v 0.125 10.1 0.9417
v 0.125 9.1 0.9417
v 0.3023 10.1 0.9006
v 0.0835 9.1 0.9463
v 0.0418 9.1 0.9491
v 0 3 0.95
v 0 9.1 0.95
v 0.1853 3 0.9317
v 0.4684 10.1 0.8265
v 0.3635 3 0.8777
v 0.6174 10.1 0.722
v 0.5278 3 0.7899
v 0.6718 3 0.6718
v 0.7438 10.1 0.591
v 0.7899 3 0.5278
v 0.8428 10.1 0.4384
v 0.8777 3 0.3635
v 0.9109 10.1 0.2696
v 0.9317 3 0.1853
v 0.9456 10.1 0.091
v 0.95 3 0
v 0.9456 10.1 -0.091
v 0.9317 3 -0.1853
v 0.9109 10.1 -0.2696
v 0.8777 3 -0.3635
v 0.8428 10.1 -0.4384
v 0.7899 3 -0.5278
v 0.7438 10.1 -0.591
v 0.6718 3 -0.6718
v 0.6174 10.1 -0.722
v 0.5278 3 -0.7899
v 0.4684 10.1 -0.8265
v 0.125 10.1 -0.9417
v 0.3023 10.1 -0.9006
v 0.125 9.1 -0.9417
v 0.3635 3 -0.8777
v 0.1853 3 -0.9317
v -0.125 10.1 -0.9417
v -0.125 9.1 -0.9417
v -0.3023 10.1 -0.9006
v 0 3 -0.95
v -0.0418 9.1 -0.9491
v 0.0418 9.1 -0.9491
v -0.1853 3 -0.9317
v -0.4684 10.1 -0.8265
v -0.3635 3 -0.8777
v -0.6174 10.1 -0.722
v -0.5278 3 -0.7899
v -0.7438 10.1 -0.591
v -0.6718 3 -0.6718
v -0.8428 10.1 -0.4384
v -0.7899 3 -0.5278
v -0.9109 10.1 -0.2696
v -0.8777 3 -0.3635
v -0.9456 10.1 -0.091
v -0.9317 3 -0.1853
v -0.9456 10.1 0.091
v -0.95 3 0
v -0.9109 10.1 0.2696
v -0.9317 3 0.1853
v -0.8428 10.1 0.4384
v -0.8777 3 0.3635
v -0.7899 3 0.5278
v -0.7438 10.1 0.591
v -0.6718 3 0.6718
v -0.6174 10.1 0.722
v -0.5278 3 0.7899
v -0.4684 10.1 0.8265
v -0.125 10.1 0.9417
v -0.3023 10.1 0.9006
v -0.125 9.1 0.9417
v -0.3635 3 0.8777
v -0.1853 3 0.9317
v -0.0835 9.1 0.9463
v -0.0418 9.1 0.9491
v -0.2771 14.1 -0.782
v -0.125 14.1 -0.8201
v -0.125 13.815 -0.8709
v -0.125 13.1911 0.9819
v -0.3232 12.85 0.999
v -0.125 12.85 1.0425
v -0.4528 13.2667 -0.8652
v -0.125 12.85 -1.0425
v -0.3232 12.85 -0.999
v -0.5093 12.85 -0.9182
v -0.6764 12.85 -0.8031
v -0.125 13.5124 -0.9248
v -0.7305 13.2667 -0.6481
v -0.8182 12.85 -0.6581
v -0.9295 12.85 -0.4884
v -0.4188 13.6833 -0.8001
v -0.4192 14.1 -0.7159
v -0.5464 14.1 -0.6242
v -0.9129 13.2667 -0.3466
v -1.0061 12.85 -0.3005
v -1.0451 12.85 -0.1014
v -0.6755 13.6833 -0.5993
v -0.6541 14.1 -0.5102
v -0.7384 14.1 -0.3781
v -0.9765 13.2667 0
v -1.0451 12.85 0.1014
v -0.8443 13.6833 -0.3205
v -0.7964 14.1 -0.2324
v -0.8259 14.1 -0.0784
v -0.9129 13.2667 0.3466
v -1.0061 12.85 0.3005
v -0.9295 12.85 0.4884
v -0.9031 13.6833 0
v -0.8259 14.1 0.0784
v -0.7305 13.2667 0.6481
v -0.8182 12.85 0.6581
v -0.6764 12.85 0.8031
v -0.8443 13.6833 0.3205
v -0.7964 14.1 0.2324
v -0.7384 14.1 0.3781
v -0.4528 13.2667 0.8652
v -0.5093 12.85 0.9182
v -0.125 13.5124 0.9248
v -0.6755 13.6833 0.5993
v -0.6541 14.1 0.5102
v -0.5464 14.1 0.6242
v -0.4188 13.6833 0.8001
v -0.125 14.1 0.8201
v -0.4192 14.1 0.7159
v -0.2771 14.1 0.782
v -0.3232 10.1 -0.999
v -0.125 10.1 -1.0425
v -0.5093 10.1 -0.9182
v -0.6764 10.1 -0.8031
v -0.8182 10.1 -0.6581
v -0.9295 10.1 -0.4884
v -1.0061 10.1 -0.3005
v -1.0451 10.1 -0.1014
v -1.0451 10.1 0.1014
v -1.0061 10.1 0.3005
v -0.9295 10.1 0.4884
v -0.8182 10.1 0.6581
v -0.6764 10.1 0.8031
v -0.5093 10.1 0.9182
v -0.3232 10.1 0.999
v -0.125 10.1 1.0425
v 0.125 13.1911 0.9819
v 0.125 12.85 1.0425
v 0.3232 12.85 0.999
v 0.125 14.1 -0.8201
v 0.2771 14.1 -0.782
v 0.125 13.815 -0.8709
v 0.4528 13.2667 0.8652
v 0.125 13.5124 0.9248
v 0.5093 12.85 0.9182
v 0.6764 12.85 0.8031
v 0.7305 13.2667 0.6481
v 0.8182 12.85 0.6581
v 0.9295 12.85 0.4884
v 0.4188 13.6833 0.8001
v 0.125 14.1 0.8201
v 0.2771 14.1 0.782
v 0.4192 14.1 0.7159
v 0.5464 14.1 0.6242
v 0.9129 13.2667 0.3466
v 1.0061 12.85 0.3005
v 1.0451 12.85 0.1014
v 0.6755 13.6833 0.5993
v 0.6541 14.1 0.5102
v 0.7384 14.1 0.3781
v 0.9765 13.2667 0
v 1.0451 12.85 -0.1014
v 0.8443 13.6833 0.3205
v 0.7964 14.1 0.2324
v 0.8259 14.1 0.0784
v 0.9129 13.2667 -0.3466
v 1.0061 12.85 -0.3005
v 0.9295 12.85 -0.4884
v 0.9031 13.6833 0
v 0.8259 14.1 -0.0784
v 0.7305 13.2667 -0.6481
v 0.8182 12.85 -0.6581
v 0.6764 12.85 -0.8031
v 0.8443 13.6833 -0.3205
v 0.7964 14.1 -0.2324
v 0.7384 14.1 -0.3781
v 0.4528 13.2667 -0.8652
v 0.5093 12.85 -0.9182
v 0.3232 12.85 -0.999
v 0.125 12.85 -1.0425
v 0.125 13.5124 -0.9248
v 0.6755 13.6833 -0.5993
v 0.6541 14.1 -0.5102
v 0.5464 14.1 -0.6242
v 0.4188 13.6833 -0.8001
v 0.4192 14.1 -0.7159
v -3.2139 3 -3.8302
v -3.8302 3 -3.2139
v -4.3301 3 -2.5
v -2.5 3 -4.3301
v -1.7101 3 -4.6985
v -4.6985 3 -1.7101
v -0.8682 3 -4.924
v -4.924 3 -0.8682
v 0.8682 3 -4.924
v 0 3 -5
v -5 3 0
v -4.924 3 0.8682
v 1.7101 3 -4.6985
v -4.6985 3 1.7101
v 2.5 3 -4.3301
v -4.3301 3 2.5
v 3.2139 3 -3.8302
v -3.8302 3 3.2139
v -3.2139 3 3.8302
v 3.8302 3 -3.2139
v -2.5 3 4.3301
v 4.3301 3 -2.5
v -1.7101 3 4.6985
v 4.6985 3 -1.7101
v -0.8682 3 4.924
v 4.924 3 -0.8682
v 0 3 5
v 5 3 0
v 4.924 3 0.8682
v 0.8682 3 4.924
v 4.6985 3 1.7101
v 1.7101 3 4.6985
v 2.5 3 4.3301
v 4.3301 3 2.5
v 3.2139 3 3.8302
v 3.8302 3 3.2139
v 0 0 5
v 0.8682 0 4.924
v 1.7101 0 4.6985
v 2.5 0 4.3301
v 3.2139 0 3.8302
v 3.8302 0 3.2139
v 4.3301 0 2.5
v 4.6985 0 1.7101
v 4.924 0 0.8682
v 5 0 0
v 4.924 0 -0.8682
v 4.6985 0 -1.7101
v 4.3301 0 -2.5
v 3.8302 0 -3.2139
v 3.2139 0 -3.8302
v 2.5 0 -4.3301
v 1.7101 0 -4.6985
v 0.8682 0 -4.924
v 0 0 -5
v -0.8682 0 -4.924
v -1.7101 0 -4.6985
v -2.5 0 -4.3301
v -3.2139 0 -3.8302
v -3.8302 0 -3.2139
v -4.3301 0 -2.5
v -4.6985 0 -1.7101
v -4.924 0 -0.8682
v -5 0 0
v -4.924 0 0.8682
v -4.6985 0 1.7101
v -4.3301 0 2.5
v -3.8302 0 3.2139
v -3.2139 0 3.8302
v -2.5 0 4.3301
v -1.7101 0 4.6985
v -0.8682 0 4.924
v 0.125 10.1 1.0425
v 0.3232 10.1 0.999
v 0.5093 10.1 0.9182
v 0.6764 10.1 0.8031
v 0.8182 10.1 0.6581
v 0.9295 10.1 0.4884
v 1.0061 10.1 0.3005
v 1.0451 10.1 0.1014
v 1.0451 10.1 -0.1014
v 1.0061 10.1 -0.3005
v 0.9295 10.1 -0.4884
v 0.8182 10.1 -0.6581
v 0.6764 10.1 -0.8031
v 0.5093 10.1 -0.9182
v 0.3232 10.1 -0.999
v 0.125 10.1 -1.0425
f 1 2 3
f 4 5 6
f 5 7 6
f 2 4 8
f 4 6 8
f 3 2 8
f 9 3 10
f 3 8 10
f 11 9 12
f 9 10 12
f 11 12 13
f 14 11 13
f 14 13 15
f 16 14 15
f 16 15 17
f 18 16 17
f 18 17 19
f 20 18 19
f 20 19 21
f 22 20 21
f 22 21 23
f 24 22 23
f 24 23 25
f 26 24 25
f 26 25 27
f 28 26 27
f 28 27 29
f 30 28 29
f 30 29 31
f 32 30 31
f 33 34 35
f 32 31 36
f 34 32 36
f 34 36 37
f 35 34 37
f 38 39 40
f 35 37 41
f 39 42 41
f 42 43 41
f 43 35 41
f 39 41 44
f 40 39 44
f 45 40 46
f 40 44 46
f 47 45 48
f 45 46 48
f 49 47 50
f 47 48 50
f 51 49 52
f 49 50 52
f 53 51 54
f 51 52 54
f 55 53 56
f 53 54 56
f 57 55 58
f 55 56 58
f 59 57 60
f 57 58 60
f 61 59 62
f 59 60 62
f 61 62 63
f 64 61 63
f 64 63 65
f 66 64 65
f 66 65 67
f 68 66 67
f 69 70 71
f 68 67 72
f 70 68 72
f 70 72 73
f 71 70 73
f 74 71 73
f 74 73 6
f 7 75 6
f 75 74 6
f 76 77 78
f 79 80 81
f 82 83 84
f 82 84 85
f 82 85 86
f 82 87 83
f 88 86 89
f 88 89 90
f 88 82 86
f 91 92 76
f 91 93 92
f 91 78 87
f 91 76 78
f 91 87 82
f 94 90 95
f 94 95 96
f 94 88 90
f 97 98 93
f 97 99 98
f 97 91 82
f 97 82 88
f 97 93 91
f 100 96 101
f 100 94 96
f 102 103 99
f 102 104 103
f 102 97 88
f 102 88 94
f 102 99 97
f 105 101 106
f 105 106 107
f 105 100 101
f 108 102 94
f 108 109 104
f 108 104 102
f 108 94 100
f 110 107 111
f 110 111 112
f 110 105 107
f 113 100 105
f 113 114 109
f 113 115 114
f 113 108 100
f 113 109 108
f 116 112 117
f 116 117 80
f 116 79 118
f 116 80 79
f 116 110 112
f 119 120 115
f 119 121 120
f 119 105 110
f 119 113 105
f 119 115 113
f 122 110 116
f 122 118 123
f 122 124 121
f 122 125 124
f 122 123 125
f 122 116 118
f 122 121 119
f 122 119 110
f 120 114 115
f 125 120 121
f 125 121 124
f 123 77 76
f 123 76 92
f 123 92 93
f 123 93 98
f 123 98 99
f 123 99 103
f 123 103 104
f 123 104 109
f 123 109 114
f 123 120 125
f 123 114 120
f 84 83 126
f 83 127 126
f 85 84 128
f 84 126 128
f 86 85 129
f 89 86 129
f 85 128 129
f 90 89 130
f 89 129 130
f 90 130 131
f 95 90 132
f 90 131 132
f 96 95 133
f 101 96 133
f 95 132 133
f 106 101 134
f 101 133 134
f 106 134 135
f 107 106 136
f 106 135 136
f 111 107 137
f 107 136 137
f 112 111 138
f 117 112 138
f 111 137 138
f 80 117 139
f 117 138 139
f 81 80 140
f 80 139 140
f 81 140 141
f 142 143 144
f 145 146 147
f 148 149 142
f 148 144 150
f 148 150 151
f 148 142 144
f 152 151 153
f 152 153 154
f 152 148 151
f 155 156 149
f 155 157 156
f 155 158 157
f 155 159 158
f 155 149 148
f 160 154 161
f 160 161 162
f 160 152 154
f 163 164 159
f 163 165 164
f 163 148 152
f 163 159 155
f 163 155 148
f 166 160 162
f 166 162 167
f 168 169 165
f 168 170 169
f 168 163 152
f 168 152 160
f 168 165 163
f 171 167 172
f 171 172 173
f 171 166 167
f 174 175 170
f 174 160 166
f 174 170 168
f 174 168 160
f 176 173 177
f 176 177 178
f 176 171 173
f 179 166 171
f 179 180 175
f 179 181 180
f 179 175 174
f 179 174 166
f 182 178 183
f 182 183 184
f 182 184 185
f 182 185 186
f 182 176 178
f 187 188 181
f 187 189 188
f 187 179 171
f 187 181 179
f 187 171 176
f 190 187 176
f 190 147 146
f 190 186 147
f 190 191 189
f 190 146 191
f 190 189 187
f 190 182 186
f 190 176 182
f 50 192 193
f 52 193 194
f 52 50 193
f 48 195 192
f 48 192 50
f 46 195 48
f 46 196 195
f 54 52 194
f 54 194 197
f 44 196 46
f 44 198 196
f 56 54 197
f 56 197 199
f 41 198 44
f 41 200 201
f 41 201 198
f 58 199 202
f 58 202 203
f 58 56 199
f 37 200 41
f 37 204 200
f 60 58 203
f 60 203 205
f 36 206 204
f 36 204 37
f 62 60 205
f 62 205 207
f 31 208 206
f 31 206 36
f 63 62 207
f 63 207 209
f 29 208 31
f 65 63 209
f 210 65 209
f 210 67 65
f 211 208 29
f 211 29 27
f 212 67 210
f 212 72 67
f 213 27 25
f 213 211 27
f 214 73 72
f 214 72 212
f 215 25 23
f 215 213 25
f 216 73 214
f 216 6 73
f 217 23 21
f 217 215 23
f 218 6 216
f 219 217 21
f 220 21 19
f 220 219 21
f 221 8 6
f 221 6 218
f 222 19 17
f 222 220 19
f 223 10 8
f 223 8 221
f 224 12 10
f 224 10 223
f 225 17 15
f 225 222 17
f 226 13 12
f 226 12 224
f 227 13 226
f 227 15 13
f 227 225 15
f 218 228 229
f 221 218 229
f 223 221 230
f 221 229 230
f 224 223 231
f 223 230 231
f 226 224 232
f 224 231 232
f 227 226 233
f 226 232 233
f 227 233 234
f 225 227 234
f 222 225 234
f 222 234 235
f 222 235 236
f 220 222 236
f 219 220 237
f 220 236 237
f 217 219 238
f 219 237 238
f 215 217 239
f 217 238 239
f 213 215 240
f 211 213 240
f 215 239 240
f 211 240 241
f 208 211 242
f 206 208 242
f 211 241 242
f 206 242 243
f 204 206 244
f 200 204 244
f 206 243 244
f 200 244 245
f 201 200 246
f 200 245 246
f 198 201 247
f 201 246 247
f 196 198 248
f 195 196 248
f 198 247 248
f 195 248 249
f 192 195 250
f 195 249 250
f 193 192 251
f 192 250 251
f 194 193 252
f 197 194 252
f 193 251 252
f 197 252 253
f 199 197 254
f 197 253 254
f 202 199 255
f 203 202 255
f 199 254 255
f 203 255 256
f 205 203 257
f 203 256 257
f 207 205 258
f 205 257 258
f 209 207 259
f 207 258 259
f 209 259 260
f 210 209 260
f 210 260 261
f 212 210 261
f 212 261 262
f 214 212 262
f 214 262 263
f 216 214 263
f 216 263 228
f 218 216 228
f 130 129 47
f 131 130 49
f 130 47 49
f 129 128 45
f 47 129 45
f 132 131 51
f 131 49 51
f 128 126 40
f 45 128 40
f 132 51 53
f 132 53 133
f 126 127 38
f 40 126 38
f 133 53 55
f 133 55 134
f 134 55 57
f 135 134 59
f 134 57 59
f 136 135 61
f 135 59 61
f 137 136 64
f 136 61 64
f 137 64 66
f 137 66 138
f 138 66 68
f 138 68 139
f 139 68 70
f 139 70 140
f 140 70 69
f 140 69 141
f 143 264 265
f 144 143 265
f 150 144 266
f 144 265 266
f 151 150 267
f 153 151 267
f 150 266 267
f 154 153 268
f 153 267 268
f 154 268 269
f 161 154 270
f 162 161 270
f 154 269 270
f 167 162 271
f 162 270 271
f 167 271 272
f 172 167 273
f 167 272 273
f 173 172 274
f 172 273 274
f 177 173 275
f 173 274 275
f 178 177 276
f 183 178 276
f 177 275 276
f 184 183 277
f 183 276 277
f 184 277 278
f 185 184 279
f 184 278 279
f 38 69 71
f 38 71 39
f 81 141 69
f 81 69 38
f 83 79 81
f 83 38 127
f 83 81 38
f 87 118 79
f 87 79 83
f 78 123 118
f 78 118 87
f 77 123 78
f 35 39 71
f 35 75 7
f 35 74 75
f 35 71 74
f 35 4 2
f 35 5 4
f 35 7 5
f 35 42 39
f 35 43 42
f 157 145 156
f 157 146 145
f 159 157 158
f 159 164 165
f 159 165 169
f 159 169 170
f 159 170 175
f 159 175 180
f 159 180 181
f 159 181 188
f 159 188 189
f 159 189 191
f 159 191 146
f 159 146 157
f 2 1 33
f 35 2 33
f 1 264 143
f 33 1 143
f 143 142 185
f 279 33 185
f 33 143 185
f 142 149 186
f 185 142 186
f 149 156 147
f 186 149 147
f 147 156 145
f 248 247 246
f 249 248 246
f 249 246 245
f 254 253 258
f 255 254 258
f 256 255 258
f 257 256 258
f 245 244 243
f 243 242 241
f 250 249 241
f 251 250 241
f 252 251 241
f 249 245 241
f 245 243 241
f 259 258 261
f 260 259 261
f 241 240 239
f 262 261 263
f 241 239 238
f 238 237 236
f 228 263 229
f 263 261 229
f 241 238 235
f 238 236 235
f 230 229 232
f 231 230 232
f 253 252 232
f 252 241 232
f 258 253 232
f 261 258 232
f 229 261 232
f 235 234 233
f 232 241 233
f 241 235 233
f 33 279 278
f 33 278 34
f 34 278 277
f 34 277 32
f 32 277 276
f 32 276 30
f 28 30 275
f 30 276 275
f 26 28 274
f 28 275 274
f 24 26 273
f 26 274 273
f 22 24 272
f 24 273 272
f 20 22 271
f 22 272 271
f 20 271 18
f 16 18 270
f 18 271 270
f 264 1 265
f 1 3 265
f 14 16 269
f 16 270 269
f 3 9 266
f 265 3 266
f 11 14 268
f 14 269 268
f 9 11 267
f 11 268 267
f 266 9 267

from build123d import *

# Parameters (mm, degrees)
ESQUISSE2_R             = 5
BOSS_EXTRU_1_DEPTH      = 3
ESQUISSE3_R             = 0.95
BOSS_EXTRU_2_DEPTH      = 7.1
ESQUISSE4_R             = 1.05
BOSS_EXTRU_3_DEPTH      = 4
CHANFREIN3_SIZE         = 1.25
CHANFREIN3_SIZE2        = 0.220408726
ESQUISSE5_W             = 0.25
ESQUISSE5_H             = 3
ENL_V_MAT_EXTRU_1_DEPTH = 5


with BuildPart() as part:
    # Esquisse2 → Boss.-Extru.1 (new body)
    with BuildSketch(Plane(origin=(0, 0, 0), x_dir=(1, 0, 0), z_dir=(0, 1, 0))):
        with Locations(Location((0, 0, 0), (0, 0, 270))):
            Circle(ESQUISSE2_R)
    extrude(amount=BOSS_EXTRU_1_DEPTH)

    # Esquisse3 → Boss.-Extru.2 (add)
    with BuildSketch(Plane(origin=(0, 3, 0), x_dir=(1, 0, 0), z_dir=(0, 1, 0))):
        with Locations(Location((0, 0, 0), (0, 0, 270))):
            Circle(ESQUISSE3_R)
    extrude(amount=BOSS_EXTRU_2_DEPTH)

    # Esquisse4 → Boss.-Extru.3 (add)
    with BuildSketch(Plane(origin=(0, 10.1, 0), x_dir=(1, 0, 0), z_dir=(0, 1, 0))):
        with Locations(Location((0, 0, 0), (0, 0, 270))):
            Circle(ESQUISSE4_R)
    extrude(amount=BOSS_EXTRU_3_DEPTH)

    # Chanfrein3
    chanfrein3_edges = [part.edges().sort_by_distance(p)[0] for p in [
        (0, 14.1, -1.05),
    ]]
    chanfrein3_side = [part.faces().sort_by_distance(p)[0] for p in [
        (0, 12.1, -1.05),
    ]]
    chamfer(chanfrein3_edges, length=CHANFREIN3_SIZE, length2=CHANFREIN3_SIZE2, reference=chanfrein3_side[0])

    # Esquisse5 → Enlèv. mat.-Extru.1 (cut)
    with BuildSketch(Plane(origin=(0, 14.1, 0), x_dir=(1, 0, 0), z_dir=(0, 1, 0))):
        Rectangle(ESQUISSE5_W, ESQUISSE5_H)
    extrude(amount=-ENL_V_MAT_EXTRU_1_DEPTH, mode=Mode.SUBTRACT)


solid = part.part
